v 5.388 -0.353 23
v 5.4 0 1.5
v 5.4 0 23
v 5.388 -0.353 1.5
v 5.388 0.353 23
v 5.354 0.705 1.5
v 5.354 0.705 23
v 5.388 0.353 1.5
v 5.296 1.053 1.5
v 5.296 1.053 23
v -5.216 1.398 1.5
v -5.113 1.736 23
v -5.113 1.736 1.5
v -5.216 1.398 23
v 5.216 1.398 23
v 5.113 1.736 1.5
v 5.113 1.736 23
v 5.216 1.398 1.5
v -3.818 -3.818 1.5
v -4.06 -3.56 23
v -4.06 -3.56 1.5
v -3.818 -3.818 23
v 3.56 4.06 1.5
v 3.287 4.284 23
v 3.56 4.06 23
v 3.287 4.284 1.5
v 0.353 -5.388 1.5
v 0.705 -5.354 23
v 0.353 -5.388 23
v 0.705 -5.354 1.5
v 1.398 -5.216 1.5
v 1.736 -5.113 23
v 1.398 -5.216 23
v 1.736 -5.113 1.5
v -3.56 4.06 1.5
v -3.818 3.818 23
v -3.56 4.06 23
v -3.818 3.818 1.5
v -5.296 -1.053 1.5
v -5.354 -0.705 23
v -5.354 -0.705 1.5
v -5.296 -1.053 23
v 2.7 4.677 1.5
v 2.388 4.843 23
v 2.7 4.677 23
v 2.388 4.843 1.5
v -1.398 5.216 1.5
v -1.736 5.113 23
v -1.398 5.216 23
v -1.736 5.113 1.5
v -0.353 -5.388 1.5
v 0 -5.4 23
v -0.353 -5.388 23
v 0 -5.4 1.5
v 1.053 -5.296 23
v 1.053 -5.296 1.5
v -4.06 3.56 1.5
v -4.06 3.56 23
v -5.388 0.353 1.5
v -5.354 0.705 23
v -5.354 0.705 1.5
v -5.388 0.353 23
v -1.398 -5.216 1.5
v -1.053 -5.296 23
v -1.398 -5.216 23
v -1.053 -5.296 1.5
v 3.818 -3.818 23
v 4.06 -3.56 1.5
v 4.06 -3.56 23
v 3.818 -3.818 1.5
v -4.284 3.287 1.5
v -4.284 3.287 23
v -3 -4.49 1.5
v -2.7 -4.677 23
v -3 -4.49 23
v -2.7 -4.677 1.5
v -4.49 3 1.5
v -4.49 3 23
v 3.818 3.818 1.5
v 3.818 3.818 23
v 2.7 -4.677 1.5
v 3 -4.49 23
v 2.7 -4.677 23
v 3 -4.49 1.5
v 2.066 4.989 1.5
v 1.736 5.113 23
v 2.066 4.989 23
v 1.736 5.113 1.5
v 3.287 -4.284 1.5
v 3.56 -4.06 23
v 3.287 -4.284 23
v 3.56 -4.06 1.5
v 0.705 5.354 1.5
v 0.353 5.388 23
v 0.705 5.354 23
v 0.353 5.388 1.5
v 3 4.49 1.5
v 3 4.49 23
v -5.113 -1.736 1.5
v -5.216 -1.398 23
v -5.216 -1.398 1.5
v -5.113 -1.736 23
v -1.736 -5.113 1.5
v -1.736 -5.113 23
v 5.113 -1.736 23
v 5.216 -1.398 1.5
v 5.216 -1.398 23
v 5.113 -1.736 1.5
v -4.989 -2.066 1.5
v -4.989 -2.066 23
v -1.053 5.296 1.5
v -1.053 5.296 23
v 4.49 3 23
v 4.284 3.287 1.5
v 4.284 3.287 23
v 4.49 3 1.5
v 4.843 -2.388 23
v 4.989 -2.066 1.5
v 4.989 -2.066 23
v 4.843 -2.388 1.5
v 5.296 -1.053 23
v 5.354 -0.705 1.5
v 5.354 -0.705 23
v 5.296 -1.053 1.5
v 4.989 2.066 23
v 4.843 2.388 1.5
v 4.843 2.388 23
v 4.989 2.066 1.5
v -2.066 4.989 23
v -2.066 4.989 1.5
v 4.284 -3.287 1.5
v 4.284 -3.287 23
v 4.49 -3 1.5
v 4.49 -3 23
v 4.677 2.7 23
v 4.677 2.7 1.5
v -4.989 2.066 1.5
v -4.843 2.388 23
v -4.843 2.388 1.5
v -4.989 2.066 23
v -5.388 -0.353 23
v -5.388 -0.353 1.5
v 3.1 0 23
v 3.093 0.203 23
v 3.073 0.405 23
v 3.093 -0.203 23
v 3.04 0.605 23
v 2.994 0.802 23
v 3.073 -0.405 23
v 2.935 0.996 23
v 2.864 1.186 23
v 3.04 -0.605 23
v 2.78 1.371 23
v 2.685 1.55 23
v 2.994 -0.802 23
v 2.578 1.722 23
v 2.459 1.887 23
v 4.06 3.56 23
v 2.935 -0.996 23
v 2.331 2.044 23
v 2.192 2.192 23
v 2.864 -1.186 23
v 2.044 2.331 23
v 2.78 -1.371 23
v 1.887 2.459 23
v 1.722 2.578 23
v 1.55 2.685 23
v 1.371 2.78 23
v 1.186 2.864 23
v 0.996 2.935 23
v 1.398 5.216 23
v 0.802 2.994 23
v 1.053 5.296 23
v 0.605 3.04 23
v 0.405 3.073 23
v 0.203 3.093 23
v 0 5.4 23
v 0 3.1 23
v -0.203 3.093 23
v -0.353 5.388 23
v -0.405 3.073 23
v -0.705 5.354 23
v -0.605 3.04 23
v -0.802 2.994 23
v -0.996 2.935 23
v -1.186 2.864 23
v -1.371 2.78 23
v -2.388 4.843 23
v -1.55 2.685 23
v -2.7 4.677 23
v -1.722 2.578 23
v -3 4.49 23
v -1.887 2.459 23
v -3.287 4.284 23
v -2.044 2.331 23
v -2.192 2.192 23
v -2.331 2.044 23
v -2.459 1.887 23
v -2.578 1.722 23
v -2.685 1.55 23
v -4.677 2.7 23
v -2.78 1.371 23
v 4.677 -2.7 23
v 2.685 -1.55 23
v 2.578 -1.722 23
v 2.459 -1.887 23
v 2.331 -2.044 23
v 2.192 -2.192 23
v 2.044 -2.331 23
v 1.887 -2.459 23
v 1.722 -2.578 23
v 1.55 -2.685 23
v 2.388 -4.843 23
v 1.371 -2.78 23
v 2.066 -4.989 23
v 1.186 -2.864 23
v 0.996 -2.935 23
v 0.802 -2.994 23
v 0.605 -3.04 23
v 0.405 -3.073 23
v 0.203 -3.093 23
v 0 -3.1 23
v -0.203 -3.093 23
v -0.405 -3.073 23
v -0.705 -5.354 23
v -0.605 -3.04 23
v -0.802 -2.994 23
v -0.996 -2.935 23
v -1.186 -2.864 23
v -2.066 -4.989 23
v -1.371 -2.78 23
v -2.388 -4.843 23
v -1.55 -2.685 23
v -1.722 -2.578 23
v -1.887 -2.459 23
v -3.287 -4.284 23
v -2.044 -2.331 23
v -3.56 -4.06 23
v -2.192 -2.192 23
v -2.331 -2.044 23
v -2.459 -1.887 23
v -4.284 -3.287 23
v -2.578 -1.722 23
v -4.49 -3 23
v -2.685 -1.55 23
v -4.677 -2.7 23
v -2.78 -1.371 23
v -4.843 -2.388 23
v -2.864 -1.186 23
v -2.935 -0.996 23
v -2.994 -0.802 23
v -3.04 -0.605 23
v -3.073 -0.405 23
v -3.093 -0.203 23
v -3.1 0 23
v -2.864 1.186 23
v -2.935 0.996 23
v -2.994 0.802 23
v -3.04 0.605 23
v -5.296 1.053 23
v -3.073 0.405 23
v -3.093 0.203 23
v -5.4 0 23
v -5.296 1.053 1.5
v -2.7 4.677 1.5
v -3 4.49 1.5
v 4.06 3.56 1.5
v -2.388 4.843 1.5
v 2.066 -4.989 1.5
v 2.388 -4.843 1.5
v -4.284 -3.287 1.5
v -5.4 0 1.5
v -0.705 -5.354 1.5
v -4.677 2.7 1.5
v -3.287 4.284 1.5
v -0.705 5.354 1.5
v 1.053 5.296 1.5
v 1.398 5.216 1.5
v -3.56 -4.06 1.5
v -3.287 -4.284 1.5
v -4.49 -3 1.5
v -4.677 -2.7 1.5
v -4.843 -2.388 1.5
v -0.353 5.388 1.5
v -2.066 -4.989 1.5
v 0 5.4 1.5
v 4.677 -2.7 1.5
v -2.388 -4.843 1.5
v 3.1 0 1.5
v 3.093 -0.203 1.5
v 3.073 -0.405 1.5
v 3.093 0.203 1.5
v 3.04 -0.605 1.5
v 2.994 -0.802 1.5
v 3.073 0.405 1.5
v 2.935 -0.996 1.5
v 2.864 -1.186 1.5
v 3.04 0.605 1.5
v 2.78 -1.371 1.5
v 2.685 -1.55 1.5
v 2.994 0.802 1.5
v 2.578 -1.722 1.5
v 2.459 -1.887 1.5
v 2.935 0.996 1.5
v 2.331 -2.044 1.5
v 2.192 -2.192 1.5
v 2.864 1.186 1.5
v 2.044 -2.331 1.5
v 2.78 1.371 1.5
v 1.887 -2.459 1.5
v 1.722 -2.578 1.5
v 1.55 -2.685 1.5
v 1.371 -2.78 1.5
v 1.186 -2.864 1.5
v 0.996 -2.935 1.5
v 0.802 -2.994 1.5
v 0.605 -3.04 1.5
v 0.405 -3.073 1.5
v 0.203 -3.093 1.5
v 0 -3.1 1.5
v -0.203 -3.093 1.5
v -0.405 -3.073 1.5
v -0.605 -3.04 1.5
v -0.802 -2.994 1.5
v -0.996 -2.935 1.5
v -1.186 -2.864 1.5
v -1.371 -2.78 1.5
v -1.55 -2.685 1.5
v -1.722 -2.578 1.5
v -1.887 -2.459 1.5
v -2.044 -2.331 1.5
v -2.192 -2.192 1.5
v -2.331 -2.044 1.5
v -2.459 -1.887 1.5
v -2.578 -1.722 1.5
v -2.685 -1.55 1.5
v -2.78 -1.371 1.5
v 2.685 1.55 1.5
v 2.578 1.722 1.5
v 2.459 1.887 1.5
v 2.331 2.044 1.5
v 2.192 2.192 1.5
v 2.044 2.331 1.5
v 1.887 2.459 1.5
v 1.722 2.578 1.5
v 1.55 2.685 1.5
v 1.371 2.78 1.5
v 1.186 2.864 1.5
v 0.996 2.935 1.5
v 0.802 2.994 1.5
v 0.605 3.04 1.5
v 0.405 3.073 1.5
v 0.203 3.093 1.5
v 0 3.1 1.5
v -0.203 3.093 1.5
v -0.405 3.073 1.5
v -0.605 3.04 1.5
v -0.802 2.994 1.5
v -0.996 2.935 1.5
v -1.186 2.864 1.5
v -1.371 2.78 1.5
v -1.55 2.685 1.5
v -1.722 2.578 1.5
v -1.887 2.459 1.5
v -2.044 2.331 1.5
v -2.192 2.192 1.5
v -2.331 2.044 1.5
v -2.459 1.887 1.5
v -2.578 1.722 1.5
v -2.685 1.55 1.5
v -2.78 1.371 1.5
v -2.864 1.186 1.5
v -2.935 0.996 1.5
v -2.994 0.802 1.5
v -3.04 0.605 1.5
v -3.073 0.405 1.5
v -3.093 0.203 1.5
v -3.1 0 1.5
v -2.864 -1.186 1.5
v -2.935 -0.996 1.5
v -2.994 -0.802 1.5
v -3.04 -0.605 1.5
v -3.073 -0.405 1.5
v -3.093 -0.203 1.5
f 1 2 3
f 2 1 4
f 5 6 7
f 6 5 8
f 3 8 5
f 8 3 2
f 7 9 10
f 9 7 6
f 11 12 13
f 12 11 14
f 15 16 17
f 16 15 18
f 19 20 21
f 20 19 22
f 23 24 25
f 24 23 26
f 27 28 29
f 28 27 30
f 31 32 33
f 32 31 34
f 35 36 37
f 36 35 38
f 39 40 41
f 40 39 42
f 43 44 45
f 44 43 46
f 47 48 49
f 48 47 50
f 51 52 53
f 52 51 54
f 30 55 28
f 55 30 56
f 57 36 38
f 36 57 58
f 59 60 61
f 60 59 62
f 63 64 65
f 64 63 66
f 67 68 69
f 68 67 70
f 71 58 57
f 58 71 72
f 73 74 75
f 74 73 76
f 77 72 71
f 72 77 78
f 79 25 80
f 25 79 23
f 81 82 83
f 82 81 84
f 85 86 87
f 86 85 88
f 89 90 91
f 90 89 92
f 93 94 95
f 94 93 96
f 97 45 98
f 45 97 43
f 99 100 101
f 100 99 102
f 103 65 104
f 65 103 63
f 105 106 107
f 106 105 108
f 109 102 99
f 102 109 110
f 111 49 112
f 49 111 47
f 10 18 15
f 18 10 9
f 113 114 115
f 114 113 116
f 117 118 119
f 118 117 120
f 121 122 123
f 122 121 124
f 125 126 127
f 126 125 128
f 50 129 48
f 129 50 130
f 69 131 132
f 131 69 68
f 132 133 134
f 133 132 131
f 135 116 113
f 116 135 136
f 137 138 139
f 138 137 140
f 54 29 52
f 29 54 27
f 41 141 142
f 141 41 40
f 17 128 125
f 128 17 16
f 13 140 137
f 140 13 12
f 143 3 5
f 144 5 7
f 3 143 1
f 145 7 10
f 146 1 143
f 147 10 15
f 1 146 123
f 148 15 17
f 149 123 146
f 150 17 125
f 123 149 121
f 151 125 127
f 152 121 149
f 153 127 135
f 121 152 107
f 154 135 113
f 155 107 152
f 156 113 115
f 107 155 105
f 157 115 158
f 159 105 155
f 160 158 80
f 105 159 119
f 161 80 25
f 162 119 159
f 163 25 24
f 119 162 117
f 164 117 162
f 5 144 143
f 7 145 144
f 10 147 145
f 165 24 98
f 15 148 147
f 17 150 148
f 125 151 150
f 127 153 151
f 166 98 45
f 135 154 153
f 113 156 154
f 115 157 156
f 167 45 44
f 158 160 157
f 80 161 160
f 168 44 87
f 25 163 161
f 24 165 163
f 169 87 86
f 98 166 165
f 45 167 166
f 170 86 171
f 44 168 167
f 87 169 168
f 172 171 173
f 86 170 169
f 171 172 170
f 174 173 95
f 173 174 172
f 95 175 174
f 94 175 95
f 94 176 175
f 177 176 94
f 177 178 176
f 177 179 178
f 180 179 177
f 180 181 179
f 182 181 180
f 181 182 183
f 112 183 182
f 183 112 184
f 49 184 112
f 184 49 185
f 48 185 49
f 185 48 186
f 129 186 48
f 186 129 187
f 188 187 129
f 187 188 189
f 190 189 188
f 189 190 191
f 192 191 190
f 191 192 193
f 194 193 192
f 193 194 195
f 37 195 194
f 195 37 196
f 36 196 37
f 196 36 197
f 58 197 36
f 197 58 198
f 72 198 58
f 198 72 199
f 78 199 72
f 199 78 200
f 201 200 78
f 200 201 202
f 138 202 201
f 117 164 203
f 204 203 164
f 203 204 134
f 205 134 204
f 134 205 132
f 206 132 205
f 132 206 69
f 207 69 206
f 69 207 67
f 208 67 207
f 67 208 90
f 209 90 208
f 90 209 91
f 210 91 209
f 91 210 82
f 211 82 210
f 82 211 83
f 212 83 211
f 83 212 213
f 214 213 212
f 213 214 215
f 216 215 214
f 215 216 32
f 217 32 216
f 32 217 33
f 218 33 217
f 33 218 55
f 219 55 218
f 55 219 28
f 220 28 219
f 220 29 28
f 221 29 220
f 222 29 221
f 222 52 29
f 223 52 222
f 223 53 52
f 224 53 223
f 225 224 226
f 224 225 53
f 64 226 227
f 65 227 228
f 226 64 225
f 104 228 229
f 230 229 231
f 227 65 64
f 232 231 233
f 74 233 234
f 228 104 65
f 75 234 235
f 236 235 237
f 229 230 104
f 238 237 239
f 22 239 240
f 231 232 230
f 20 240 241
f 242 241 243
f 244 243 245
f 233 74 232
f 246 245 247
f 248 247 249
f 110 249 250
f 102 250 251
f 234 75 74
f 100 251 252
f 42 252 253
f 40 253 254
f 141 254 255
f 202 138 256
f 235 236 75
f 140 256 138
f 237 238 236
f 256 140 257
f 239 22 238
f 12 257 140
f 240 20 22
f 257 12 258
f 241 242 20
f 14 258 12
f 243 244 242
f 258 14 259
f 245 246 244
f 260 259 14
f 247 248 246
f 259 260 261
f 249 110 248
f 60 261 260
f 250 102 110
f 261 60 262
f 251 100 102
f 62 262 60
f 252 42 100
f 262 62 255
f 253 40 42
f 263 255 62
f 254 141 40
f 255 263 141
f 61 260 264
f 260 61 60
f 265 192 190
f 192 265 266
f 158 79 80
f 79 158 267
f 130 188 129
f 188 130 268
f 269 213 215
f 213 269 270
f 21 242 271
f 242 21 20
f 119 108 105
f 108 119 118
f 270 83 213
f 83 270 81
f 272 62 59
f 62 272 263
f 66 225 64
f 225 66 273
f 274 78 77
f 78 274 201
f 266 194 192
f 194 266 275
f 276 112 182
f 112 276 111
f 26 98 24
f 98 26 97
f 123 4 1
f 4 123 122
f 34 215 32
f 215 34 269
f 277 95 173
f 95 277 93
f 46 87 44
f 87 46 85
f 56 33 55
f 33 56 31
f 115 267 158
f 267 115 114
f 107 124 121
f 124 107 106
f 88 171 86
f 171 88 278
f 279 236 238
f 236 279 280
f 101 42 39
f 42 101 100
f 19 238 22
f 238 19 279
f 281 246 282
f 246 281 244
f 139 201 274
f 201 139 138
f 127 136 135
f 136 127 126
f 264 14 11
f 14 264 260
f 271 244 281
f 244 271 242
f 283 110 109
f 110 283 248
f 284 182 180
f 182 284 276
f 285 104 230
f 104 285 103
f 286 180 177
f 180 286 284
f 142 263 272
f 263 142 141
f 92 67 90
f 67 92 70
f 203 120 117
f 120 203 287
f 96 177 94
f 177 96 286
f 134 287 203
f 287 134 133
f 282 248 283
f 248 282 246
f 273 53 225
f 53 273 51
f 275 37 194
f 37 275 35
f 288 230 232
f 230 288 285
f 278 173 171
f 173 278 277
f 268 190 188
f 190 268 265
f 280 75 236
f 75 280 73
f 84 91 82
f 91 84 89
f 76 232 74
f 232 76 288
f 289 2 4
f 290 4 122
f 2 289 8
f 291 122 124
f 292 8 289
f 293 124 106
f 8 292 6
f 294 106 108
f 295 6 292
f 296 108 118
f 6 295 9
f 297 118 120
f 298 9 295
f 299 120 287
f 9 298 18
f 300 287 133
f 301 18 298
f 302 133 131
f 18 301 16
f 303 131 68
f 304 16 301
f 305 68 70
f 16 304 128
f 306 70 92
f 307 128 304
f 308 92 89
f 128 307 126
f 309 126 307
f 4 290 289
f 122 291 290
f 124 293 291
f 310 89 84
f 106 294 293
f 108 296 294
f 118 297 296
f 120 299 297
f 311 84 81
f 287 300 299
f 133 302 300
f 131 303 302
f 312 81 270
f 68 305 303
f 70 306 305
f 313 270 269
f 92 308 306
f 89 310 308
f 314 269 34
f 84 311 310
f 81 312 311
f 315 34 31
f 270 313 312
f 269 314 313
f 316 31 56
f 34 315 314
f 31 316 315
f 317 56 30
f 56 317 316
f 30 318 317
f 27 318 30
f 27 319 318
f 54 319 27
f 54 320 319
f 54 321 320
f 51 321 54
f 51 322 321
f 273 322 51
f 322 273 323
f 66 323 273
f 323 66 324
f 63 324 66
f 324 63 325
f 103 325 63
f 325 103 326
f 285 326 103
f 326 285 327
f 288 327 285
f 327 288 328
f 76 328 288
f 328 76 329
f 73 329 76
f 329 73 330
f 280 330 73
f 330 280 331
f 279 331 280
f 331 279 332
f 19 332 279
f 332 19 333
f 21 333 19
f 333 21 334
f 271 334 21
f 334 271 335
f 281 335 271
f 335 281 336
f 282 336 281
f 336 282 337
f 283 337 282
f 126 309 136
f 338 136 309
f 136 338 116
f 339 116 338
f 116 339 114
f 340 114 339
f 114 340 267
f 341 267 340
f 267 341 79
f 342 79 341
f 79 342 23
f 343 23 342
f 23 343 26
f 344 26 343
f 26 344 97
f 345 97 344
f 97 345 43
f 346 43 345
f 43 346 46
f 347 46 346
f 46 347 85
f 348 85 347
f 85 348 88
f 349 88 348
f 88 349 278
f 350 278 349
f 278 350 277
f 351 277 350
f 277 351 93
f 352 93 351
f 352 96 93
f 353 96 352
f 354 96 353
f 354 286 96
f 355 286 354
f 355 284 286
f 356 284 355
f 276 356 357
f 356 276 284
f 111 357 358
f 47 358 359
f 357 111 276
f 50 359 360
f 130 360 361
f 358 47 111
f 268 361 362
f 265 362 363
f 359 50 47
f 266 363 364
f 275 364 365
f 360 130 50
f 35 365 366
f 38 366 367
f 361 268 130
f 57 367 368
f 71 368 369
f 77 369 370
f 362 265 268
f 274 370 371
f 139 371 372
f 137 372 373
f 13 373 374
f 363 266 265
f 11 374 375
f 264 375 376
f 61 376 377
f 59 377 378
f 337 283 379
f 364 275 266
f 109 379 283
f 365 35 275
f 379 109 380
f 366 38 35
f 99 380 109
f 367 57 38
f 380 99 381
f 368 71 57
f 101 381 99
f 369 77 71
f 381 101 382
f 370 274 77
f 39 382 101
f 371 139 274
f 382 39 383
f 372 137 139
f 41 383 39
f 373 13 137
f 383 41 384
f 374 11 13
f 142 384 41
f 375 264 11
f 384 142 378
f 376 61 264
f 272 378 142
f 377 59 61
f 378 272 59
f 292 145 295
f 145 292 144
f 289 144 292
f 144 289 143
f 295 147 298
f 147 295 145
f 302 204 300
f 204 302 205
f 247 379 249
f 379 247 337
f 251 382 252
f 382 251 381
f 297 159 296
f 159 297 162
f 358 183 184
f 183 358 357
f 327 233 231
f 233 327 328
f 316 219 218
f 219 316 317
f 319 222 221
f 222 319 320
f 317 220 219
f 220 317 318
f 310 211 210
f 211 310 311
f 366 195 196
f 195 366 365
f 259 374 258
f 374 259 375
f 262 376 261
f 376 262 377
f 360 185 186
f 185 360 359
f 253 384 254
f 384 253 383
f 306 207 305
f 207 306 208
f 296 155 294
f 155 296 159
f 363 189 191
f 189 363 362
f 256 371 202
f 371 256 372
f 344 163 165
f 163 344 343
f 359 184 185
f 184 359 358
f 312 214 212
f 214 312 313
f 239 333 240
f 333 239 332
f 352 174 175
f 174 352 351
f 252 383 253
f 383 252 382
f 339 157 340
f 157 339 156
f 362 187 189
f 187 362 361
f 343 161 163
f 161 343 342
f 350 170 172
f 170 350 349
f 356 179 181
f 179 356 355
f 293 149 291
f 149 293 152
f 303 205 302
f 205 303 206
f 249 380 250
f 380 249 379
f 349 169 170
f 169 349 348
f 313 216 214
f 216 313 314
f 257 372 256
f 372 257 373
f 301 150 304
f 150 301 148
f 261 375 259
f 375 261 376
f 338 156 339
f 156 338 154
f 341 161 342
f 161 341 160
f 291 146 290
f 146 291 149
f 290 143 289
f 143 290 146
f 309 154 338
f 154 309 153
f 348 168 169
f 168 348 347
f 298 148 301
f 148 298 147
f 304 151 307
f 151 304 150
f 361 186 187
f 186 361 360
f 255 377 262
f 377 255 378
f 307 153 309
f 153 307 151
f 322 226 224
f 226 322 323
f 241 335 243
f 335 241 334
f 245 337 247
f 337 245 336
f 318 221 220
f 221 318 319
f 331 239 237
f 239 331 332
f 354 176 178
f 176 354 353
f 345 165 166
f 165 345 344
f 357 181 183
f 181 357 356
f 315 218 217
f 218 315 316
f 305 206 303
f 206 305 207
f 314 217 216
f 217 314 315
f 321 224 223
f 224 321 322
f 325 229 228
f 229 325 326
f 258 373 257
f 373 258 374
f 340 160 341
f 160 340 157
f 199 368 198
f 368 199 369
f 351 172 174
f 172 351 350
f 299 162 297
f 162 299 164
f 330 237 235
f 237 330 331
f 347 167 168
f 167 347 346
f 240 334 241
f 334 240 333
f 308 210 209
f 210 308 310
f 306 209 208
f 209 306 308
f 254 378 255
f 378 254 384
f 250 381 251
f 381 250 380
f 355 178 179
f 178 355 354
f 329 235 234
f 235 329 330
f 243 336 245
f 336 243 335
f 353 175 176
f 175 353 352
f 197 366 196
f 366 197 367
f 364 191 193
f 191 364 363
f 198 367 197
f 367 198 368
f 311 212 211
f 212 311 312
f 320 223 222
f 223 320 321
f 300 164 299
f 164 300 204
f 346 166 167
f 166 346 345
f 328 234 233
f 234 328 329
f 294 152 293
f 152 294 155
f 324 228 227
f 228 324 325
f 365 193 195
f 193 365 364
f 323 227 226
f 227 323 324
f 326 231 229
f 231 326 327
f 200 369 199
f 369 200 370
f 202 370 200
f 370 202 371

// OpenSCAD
// PCR Tube Adapter Sleeve - fits 0.2mL tubes into 1.5mL rack holes.
// Print orientation: Collar on bed (z=0 to 1.5), body rises to z=21.5.

// Dimensions
collar_od = 13;      // Collar outer diameter
collar_t  = 1.5;     // Collar thickness (height)
body_od   = 10.8;    // Sleeve body outer diameter
body_h    = 21.5;    // Total height of the sleeve body (from top of collar)
bore_d    = 6.2;     // Bore diameter

// Derived dimensions
collar_z_max = collar_t;
body_z_max   = collar_z_max + body_h;
body_start_z = collar_z_max;

// Ensure smooth rendering for cylindrical surfaces
$fn = 96;

module adapter() {
    difference() {
        // 1. Main Body Cylinder (Outer Shell)
        // Starts at z=0, goes up to body_z_max
        cylinder(h = body_z_max, d = body_od);

        // 2. Collar (Outer Ring)
        // Starts at z=0, goes up to collar_z_max
        // We subtract this from the main body to create the step down
        cylinder(h = collar_z_max, d = collar_od);

        // 3. Bore (Inner Hole)
        // Runs through the full height of the part
        translate([0, 0, -1]) cylinder(h = body_z_max + 2, d = bore_d);
    }
}

adapter();
